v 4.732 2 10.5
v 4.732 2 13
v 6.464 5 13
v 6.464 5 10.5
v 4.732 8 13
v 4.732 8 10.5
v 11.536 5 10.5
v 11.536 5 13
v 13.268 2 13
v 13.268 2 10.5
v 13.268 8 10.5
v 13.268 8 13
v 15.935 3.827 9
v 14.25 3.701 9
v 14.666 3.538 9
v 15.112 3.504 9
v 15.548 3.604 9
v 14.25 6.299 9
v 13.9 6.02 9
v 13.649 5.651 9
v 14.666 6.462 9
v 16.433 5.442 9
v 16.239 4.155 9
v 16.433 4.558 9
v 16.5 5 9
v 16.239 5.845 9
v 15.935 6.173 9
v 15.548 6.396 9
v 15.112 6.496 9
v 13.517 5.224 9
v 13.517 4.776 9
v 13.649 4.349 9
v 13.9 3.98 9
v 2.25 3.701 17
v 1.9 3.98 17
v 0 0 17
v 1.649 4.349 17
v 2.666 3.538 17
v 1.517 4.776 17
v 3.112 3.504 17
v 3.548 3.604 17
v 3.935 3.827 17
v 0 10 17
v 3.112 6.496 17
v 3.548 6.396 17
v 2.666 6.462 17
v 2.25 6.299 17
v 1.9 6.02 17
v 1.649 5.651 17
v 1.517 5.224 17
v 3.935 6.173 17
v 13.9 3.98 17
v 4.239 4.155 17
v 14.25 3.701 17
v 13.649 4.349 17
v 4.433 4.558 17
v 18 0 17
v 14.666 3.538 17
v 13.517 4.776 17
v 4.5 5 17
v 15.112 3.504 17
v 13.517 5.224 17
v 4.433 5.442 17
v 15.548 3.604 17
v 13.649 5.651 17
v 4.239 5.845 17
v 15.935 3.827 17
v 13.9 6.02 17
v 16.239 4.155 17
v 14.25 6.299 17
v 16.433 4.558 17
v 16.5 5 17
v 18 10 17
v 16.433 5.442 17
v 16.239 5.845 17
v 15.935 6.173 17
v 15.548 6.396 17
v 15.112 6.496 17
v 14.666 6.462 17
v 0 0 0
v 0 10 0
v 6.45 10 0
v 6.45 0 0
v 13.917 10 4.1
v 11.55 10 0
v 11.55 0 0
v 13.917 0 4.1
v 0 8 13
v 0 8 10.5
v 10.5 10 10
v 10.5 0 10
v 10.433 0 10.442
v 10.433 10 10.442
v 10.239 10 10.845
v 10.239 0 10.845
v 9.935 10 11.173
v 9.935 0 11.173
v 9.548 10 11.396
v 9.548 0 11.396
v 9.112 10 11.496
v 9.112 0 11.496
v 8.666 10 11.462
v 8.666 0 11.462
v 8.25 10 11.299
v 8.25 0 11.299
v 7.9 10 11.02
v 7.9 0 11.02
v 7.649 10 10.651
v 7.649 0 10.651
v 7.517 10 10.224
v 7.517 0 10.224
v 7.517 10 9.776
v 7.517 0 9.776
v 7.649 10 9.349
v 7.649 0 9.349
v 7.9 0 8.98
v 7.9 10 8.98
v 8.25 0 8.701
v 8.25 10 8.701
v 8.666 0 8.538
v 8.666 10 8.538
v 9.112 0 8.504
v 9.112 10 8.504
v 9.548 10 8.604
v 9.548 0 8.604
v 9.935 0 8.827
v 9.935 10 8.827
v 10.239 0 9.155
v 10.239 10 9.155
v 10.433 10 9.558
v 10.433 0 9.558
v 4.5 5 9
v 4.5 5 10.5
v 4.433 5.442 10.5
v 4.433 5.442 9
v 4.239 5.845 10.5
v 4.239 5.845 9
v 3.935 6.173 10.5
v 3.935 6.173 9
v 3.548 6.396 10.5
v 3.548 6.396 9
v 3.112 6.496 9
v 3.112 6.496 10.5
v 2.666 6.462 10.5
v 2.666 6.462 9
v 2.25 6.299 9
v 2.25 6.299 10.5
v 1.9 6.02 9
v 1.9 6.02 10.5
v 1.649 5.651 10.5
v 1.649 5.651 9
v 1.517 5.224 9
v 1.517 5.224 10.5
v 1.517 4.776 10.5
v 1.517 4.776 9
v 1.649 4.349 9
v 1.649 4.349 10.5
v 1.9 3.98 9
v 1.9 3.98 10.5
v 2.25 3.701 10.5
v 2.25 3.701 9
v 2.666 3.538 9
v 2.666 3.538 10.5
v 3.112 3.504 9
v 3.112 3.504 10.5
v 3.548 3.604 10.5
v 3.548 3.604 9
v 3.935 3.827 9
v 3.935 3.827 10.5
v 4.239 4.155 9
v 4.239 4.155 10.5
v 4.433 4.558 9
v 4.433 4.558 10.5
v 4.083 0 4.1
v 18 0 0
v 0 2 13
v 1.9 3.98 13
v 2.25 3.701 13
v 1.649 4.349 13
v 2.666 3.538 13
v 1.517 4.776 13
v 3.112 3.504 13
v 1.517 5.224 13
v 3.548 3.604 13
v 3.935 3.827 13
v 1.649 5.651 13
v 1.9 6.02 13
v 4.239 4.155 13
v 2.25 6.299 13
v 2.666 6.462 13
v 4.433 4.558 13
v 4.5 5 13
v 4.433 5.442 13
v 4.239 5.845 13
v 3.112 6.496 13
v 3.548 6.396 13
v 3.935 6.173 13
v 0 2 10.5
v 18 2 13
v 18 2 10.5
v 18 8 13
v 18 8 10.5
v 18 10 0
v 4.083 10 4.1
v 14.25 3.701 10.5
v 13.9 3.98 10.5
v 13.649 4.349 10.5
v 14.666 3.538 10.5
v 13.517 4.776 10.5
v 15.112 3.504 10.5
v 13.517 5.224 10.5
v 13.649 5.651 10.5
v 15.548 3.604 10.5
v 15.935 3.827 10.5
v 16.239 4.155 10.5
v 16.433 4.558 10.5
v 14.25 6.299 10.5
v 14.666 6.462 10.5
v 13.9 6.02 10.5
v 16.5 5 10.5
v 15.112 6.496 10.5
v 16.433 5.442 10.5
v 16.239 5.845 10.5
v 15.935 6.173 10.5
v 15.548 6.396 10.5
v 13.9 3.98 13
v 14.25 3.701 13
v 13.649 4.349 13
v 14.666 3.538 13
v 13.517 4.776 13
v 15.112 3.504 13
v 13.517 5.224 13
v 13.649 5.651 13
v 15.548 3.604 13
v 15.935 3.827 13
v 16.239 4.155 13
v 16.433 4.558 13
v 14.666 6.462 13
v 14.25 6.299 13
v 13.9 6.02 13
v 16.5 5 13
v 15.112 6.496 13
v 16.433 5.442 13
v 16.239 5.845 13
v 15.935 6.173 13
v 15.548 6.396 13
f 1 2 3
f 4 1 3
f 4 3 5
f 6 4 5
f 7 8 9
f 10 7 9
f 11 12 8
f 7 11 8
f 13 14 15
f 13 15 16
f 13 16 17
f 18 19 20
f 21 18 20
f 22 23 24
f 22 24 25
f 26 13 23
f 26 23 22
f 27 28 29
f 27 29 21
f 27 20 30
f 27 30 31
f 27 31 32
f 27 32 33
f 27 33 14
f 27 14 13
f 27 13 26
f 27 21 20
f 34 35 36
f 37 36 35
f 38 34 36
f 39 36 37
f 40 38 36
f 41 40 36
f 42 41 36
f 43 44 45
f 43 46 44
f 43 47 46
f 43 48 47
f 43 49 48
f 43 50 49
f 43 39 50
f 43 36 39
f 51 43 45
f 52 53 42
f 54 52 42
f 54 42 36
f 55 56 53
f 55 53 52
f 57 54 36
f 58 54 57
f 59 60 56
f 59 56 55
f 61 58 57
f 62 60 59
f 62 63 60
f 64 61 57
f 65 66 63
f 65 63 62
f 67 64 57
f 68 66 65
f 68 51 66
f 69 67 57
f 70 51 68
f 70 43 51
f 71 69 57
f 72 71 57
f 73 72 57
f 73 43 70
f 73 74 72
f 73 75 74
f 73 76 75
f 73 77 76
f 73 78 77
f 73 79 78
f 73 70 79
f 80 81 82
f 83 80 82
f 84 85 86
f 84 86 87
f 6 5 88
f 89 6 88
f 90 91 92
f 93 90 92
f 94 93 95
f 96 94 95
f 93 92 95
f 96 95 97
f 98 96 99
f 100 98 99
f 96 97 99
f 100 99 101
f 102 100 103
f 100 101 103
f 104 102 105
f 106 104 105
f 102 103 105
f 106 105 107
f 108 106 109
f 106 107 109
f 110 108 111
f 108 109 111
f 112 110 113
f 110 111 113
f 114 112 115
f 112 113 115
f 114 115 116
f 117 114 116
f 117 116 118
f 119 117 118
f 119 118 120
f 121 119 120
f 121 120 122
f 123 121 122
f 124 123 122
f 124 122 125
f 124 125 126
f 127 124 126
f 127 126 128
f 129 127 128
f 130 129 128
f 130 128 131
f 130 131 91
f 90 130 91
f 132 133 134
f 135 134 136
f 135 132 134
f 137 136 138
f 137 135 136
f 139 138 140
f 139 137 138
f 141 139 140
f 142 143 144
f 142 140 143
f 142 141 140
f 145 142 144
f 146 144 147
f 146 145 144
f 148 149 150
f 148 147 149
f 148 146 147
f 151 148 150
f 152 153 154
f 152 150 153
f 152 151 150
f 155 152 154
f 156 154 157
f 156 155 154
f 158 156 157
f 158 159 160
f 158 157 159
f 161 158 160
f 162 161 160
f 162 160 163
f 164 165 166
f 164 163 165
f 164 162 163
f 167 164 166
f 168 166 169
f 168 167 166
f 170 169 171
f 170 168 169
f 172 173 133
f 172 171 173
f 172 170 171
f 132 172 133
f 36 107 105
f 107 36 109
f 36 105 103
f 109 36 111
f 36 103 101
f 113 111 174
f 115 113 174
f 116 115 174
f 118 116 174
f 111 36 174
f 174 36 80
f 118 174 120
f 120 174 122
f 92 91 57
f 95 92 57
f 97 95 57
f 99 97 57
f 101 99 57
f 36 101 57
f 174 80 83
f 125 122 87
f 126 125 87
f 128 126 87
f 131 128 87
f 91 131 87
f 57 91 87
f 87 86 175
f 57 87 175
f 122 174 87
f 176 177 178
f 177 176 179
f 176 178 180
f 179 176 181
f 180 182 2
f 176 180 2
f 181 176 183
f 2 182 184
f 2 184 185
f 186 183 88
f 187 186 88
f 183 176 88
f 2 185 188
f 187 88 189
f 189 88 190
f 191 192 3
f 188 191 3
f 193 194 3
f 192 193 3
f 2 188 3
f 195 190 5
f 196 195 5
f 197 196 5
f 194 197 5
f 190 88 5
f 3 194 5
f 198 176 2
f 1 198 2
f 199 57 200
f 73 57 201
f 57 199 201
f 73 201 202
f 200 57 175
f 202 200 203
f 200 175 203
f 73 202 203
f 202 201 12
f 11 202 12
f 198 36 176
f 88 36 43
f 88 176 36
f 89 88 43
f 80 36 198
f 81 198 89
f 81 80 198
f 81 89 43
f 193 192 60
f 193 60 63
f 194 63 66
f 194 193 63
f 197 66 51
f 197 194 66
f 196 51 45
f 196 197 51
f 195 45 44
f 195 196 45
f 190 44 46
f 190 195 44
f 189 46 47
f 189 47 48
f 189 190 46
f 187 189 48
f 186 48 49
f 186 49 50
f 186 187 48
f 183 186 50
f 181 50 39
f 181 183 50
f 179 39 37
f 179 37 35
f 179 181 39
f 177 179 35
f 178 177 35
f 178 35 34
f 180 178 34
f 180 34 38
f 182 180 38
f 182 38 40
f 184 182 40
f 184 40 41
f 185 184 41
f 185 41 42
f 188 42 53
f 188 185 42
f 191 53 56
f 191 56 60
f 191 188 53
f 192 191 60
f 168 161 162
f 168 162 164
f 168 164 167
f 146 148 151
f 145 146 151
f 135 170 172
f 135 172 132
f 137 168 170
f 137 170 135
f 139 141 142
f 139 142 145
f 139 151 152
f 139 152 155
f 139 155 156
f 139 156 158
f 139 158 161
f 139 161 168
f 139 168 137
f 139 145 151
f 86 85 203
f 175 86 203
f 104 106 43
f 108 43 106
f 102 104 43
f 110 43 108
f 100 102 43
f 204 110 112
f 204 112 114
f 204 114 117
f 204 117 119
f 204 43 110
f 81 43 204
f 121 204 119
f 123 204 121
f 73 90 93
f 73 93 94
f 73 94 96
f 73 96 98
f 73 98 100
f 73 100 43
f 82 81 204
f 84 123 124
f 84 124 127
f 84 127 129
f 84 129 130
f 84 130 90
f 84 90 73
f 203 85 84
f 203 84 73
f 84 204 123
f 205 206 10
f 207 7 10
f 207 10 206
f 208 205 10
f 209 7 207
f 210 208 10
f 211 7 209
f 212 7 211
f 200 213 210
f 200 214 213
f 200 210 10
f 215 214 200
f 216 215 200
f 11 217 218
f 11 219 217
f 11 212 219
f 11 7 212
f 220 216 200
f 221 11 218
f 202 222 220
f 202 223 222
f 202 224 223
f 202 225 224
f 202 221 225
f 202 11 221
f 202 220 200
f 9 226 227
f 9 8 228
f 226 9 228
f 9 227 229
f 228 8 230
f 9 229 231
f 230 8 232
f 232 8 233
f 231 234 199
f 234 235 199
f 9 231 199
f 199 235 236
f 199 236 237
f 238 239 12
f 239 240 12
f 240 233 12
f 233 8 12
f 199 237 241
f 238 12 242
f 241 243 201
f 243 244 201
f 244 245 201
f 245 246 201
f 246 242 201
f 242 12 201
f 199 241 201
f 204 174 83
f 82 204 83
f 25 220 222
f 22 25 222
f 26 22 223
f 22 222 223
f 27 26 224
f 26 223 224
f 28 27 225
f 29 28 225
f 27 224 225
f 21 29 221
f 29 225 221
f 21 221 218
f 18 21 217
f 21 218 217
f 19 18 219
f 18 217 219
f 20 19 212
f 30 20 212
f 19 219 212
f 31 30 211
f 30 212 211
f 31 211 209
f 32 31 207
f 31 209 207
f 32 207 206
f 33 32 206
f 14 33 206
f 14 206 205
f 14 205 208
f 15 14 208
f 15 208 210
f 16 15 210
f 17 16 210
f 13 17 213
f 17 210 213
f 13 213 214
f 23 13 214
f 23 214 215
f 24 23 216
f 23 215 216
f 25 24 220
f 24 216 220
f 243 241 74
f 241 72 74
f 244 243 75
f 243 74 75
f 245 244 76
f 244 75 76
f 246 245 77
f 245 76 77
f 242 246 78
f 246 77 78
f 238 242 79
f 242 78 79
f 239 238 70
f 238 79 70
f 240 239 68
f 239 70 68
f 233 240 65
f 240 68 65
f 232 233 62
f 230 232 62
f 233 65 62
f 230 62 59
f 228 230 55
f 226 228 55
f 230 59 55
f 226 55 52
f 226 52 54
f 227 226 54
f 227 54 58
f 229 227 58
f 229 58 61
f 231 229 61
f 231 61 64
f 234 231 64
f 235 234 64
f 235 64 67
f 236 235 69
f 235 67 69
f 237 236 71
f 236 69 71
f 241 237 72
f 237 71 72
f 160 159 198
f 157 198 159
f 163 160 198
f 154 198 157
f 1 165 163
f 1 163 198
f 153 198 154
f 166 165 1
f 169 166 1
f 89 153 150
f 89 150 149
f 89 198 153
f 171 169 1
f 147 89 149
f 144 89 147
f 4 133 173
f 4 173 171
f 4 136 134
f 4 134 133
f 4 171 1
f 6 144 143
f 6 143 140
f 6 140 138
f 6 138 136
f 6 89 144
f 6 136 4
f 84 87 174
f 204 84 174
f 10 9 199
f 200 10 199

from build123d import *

# Parameters (mm, degrees)
SKETCH_W        = 18
SKETCH_H        = 10
PAD_DEPTH       = 17
SKETCH009_R     = 1.5
POCKET_DEPTH    = 4
POCKET001_DEPTH = 2.5
POCKET002_DEPTH = 10.001
SKETCH012_R     = 1.5
POCKET003_DEPTH = 10.001


with BuildPart() as part:
    # Sketch → Pad (new body)
    with BuildSketch(Plane.XY):
        with Locations((9, 5)):
            Rectangle(SKETCH_W, SKETCH_H)
    extrude(amount=PAD_DEPTH)

    # Sketch009 (on DatumPlane) → Pocket (cut, symmetric)
    with BuildSketch(Plane.XY.offset(13)):
        with Locations((3, 5)):
            Circle(SKETCH009_R)
        with Locations((15, 5)):
            Circle(SKETCH009_R)
    extrude(amount=POCKET_DEPTH, both=True, mode=Mode.SUBTRACT)

    # Sketch010 (on DatumPlane) → Pocket001 (cut)
    with BuildSketch(Plane.XY.offset(13)):
        Polygon((4.732051, 2), (6.464102, 5), (4.732051, 8), (1.267949, 8), (0, 8), (0, 2), (1.267949, 2), align=None)
        Polygon((16.732051, 8), (13.267949, 8), (11.535898, 5), (13.267949, 2), (16.732051, 2), (18, 2), (18, 8), align=None)
    extrude(amount=-POCKET001_DEPTH, mode=Mode.SUBTRACT)

    # Sketch011 → Pocket002 (cut, through all)
    with BuildSketch(Plane.XZ):
        Polygon((6.45, 0), (11.55, 0), (13.917136, 4.1), (4.082864, 4.1), align=None)
    extrude(amount=-POCKET002_DEPTH, mode=Mode.SUBTRACT)

    # Sketch012 → Pocket003 (cut, through all)
    with BuildSketch(Plane.XZ):
        with Locations((9, 10)):
            Circle(SKETCH012_R)
    extrude(amount=-POCKET003_DEPTH, mode=Mode.SUBTRACT)


solid = part.part
